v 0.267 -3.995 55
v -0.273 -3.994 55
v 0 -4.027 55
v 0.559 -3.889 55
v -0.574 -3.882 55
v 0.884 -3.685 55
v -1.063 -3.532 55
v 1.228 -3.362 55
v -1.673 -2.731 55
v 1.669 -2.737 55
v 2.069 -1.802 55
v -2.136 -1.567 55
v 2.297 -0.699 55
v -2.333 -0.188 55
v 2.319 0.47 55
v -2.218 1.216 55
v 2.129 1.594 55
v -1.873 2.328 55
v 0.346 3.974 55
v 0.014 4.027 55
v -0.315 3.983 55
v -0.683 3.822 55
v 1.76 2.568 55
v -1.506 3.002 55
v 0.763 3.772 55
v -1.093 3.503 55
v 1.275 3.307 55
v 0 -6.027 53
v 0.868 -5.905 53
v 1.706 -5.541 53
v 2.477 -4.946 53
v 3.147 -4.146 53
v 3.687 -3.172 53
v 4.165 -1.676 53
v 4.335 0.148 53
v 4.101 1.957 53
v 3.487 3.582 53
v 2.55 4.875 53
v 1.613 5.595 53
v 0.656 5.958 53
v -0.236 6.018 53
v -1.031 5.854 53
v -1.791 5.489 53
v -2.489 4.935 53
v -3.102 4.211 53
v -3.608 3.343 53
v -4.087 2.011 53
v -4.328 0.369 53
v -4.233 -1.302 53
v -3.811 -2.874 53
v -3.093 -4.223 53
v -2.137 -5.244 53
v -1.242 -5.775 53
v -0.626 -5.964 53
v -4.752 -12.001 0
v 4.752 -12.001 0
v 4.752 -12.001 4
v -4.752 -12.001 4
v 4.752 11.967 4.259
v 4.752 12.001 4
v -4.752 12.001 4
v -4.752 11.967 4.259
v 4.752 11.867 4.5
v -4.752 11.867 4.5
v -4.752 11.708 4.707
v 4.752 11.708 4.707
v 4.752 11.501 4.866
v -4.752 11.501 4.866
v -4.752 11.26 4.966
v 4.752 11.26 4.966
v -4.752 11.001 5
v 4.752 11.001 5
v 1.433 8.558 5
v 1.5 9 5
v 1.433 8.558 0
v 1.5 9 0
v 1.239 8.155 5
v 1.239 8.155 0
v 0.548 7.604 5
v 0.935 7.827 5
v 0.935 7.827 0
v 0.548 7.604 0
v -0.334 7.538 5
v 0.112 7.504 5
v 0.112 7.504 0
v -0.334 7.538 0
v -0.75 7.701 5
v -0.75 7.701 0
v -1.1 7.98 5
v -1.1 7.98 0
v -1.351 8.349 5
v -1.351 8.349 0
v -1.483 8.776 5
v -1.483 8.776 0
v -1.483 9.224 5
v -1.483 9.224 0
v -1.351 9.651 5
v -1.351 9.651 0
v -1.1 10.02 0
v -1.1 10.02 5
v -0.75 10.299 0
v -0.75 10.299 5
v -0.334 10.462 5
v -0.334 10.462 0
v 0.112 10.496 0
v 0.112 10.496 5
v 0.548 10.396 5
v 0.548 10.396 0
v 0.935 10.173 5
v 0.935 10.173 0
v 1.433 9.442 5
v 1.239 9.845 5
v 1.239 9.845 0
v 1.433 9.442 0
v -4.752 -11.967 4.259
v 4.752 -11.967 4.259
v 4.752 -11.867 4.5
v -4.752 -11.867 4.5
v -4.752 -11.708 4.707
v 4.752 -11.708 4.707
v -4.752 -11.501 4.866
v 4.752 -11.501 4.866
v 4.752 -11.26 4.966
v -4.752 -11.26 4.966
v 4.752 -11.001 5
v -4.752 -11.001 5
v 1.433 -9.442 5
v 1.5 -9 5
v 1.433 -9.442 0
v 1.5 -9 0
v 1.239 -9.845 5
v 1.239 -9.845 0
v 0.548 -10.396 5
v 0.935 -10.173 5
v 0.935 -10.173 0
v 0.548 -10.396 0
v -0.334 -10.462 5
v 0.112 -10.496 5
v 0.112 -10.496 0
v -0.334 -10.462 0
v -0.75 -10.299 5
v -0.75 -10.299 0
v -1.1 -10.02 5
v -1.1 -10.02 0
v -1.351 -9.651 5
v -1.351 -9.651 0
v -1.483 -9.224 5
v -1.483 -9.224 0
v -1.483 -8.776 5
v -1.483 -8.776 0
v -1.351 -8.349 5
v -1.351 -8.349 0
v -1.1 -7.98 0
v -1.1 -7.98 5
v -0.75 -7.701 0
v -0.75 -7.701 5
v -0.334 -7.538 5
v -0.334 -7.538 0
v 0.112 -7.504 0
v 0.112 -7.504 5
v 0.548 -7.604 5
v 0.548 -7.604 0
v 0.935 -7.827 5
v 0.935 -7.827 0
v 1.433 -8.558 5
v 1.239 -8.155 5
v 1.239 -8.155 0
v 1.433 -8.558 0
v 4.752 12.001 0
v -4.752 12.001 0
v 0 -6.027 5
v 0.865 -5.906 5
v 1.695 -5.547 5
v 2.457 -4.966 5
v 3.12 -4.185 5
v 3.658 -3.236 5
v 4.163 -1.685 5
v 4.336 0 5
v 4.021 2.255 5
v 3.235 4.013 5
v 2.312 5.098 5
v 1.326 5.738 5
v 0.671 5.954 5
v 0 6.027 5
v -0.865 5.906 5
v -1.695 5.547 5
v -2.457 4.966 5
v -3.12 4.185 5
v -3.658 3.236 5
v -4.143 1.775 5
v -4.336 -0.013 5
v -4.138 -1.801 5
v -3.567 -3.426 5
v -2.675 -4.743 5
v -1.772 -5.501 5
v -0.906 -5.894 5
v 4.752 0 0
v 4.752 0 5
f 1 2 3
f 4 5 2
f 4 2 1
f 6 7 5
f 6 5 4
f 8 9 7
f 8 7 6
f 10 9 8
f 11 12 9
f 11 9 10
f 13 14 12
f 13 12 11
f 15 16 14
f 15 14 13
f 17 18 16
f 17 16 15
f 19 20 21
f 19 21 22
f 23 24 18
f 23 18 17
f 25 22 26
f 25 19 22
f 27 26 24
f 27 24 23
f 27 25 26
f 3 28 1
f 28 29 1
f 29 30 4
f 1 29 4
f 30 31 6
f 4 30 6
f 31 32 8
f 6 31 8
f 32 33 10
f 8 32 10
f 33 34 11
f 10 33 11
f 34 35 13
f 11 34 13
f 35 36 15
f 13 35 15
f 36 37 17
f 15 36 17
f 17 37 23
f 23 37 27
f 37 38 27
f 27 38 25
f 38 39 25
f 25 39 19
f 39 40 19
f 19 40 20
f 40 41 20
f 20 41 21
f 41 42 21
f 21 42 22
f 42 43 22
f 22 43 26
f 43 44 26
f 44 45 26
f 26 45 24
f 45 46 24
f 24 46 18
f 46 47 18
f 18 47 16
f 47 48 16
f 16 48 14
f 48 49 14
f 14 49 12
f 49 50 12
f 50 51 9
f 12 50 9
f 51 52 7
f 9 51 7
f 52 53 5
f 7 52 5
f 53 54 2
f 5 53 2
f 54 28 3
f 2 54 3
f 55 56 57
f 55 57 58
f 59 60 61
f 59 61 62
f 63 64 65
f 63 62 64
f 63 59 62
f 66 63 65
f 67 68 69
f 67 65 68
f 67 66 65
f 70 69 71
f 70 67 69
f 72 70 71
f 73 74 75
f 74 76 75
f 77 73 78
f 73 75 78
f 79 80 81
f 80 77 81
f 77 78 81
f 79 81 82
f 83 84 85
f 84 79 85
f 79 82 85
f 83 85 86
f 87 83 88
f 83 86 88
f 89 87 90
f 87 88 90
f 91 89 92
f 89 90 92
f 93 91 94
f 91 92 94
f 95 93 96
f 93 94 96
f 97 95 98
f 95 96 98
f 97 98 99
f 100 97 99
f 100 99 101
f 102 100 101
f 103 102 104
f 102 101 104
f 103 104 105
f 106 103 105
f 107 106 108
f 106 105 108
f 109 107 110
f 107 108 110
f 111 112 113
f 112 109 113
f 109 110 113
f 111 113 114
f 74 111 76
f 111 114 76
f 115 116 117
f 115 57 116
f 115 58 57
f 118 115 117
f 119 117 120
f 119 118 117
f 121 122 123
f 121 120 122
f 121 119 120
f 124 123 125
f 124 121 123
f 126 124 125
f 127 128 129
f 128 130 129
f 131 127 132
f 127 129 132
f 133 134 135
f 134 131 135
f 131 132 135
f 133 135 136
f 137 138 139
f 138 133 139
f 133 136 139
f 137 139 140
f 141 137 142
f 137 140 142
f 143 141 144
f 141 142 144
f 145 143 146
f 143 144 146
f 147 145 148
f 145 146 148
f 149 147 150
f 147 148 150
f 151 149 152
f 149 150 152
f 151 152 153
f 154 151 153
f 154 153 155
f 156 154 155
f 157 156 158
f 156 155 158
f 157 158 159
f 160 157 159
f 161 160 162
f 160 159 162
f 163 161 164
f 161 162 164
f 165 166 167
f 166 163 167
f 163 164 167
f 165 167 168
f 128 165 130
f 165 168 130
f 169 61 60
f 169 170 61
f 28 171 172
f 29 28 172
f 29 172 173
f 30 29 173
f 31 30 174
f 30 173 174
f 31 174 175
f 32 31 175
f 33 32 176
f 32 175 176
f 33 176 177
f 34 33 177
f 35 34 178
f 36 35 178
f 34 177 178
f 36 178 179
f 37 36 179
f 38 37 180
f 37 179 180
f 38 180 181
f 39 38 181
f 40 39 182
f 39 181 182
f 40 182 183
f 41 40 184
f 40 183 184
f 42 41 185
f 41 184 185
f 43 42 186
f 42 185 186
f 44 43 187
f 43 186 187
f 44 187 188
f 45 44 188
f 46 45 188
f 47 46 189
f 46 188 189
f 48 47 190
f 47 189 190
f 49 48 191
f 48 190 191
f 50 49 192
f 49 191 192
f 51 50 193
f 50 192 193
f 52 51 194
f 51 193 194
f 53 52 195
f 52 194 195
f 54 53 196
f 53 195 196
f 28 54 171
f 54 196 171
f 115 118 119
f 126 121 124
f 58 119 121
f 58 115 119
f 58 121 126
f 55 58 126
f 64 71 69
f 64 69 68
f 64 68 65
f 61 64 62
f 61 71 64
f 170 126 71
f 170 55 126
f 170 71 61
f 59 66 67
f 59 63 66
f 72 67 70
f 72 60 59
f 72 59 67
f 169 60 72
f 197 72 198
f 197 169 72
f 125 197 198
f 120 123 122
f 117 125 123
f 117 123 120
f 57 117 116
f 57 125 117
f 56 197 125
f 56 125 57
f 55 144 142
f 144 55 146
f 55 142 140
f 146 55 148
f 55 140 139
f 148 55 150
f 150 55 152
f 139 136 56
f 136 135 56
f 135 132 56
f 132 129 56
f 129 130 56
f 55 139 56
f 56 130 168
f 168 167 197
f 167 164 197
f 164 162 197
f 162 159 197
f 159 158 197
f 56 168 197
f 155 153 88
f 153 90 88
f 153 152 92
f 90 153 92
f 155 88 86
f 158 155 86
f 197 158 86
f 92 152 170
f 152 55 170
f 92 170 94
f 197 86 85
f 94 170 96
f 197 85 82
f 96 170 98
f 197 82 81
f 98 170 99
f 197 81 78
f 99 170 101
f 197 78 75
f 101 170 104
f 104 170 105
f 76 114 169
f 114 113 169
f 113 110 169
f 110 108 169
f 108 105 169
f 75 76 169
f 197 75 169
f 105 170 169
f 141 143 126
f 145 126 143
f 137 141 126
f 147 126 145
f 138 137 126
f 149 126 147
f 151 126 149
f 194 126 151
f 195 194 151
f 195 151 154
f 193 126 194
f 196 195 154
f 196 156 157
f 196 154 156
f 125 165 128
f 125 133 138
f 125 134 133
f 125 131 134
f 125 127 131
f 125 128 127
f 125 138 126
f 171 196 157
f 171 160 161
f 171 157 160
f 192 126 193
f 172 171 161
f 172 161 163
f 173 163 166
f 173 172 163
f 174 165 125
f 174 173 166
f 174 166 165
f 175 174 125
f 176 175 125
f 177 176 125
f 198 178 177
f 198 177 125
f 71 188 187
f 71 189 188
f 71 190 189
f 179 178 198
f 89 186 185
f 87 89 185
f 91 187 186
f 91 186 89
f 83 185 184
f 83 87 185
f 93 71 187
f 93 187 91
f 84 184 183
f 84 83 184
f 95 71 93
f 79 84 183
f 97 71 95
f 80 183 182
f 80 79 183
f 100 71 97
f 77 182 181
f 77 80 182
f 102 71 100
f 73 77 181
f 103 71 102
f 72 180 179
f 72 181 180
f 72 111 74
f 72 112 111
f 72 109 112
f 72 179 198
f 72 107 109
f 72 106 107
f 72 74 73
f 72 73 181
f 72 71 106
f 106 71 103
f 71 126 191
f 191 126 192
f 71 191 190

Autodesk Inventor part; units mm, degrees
ref_plane "YZ Plane" through (0, 0, 0) normal (1, 0, 0) x (0, 1, 0)
ref_plane "XZ Plane" through (0, 0, 0) normal (0, 1, 0) x (-1, 0, 0)
ref_plane "XY Plane" through (0, 0, 0) normal (0, 0, 1) x (1, 0, 0)
sketch "Sketch1" plane through (0, 0, 0) normal (0, 0, 1) x (1, 0, 0)
  line L0 (0, 0) -> (8.5363, 0)
  circle A0 centre (0, 9) radius 1.5
  circle A1 centre (0, -9) radius 1.5
  line L1 (-4.7525, 12.0011) -> (4.7525, 12.0011)
  line L2 (4.7525, 12.0011) -> (4.7525, -12.0011)
  line L3 (4.7525, -12.0011) -> (-4.7525, -12.0011)
  line L4 (-4.7525, -12.0011) -> (-4.7525, 12.0011)
  ellipse E0 centre (0, 0) end of major axis (0, 6.027) minor radius 4.3359
  ellipse E1 centre (-34.059, -8.6397) end of major axis (-34.059, -4.9131) minor radius 2.5528
  ellipse E2 centre (-34.1113, -8.6921) end of major axis (-34.1113, -2.6651) minor radius 4.3359
  point P0 (0, 12.0011)
  point P1 (0, -12.0011)
  point P2 (-4.7525, 0)
  point P3 (4.7525, 0)
extrude "Extrusion1" add sketch "Sketch1" along normal blind 5 contours L2 L3 L4 L1
sketch "Sketch2" plane through (0, 0, 5) normal (0, 0, 1) x (1, 0, 0)
  point P0 (0, 0)
sketch "Sketch3" plane through (0, 0, 5) normal (0, 0, 1) x (1, 0, 0)
  ellipse E0 centre (0, 0) end of major axis (0, -6.027) minor radius 4.3359 projected
extrude "Extrusion2" add sketch "Sketch3" along normal blind 50 and the other way blind 5
chamfer "Chamfer1" distance 2 angle 45 1 edges at (0, 6.027, 55)
fillet "Fillet1" radius 1 1 edges at (0, 12.0011, 5)
fillet "Fillet2" radius 1 1 edges at (0, -12.0011, 5)
properties part number "apoioP"
